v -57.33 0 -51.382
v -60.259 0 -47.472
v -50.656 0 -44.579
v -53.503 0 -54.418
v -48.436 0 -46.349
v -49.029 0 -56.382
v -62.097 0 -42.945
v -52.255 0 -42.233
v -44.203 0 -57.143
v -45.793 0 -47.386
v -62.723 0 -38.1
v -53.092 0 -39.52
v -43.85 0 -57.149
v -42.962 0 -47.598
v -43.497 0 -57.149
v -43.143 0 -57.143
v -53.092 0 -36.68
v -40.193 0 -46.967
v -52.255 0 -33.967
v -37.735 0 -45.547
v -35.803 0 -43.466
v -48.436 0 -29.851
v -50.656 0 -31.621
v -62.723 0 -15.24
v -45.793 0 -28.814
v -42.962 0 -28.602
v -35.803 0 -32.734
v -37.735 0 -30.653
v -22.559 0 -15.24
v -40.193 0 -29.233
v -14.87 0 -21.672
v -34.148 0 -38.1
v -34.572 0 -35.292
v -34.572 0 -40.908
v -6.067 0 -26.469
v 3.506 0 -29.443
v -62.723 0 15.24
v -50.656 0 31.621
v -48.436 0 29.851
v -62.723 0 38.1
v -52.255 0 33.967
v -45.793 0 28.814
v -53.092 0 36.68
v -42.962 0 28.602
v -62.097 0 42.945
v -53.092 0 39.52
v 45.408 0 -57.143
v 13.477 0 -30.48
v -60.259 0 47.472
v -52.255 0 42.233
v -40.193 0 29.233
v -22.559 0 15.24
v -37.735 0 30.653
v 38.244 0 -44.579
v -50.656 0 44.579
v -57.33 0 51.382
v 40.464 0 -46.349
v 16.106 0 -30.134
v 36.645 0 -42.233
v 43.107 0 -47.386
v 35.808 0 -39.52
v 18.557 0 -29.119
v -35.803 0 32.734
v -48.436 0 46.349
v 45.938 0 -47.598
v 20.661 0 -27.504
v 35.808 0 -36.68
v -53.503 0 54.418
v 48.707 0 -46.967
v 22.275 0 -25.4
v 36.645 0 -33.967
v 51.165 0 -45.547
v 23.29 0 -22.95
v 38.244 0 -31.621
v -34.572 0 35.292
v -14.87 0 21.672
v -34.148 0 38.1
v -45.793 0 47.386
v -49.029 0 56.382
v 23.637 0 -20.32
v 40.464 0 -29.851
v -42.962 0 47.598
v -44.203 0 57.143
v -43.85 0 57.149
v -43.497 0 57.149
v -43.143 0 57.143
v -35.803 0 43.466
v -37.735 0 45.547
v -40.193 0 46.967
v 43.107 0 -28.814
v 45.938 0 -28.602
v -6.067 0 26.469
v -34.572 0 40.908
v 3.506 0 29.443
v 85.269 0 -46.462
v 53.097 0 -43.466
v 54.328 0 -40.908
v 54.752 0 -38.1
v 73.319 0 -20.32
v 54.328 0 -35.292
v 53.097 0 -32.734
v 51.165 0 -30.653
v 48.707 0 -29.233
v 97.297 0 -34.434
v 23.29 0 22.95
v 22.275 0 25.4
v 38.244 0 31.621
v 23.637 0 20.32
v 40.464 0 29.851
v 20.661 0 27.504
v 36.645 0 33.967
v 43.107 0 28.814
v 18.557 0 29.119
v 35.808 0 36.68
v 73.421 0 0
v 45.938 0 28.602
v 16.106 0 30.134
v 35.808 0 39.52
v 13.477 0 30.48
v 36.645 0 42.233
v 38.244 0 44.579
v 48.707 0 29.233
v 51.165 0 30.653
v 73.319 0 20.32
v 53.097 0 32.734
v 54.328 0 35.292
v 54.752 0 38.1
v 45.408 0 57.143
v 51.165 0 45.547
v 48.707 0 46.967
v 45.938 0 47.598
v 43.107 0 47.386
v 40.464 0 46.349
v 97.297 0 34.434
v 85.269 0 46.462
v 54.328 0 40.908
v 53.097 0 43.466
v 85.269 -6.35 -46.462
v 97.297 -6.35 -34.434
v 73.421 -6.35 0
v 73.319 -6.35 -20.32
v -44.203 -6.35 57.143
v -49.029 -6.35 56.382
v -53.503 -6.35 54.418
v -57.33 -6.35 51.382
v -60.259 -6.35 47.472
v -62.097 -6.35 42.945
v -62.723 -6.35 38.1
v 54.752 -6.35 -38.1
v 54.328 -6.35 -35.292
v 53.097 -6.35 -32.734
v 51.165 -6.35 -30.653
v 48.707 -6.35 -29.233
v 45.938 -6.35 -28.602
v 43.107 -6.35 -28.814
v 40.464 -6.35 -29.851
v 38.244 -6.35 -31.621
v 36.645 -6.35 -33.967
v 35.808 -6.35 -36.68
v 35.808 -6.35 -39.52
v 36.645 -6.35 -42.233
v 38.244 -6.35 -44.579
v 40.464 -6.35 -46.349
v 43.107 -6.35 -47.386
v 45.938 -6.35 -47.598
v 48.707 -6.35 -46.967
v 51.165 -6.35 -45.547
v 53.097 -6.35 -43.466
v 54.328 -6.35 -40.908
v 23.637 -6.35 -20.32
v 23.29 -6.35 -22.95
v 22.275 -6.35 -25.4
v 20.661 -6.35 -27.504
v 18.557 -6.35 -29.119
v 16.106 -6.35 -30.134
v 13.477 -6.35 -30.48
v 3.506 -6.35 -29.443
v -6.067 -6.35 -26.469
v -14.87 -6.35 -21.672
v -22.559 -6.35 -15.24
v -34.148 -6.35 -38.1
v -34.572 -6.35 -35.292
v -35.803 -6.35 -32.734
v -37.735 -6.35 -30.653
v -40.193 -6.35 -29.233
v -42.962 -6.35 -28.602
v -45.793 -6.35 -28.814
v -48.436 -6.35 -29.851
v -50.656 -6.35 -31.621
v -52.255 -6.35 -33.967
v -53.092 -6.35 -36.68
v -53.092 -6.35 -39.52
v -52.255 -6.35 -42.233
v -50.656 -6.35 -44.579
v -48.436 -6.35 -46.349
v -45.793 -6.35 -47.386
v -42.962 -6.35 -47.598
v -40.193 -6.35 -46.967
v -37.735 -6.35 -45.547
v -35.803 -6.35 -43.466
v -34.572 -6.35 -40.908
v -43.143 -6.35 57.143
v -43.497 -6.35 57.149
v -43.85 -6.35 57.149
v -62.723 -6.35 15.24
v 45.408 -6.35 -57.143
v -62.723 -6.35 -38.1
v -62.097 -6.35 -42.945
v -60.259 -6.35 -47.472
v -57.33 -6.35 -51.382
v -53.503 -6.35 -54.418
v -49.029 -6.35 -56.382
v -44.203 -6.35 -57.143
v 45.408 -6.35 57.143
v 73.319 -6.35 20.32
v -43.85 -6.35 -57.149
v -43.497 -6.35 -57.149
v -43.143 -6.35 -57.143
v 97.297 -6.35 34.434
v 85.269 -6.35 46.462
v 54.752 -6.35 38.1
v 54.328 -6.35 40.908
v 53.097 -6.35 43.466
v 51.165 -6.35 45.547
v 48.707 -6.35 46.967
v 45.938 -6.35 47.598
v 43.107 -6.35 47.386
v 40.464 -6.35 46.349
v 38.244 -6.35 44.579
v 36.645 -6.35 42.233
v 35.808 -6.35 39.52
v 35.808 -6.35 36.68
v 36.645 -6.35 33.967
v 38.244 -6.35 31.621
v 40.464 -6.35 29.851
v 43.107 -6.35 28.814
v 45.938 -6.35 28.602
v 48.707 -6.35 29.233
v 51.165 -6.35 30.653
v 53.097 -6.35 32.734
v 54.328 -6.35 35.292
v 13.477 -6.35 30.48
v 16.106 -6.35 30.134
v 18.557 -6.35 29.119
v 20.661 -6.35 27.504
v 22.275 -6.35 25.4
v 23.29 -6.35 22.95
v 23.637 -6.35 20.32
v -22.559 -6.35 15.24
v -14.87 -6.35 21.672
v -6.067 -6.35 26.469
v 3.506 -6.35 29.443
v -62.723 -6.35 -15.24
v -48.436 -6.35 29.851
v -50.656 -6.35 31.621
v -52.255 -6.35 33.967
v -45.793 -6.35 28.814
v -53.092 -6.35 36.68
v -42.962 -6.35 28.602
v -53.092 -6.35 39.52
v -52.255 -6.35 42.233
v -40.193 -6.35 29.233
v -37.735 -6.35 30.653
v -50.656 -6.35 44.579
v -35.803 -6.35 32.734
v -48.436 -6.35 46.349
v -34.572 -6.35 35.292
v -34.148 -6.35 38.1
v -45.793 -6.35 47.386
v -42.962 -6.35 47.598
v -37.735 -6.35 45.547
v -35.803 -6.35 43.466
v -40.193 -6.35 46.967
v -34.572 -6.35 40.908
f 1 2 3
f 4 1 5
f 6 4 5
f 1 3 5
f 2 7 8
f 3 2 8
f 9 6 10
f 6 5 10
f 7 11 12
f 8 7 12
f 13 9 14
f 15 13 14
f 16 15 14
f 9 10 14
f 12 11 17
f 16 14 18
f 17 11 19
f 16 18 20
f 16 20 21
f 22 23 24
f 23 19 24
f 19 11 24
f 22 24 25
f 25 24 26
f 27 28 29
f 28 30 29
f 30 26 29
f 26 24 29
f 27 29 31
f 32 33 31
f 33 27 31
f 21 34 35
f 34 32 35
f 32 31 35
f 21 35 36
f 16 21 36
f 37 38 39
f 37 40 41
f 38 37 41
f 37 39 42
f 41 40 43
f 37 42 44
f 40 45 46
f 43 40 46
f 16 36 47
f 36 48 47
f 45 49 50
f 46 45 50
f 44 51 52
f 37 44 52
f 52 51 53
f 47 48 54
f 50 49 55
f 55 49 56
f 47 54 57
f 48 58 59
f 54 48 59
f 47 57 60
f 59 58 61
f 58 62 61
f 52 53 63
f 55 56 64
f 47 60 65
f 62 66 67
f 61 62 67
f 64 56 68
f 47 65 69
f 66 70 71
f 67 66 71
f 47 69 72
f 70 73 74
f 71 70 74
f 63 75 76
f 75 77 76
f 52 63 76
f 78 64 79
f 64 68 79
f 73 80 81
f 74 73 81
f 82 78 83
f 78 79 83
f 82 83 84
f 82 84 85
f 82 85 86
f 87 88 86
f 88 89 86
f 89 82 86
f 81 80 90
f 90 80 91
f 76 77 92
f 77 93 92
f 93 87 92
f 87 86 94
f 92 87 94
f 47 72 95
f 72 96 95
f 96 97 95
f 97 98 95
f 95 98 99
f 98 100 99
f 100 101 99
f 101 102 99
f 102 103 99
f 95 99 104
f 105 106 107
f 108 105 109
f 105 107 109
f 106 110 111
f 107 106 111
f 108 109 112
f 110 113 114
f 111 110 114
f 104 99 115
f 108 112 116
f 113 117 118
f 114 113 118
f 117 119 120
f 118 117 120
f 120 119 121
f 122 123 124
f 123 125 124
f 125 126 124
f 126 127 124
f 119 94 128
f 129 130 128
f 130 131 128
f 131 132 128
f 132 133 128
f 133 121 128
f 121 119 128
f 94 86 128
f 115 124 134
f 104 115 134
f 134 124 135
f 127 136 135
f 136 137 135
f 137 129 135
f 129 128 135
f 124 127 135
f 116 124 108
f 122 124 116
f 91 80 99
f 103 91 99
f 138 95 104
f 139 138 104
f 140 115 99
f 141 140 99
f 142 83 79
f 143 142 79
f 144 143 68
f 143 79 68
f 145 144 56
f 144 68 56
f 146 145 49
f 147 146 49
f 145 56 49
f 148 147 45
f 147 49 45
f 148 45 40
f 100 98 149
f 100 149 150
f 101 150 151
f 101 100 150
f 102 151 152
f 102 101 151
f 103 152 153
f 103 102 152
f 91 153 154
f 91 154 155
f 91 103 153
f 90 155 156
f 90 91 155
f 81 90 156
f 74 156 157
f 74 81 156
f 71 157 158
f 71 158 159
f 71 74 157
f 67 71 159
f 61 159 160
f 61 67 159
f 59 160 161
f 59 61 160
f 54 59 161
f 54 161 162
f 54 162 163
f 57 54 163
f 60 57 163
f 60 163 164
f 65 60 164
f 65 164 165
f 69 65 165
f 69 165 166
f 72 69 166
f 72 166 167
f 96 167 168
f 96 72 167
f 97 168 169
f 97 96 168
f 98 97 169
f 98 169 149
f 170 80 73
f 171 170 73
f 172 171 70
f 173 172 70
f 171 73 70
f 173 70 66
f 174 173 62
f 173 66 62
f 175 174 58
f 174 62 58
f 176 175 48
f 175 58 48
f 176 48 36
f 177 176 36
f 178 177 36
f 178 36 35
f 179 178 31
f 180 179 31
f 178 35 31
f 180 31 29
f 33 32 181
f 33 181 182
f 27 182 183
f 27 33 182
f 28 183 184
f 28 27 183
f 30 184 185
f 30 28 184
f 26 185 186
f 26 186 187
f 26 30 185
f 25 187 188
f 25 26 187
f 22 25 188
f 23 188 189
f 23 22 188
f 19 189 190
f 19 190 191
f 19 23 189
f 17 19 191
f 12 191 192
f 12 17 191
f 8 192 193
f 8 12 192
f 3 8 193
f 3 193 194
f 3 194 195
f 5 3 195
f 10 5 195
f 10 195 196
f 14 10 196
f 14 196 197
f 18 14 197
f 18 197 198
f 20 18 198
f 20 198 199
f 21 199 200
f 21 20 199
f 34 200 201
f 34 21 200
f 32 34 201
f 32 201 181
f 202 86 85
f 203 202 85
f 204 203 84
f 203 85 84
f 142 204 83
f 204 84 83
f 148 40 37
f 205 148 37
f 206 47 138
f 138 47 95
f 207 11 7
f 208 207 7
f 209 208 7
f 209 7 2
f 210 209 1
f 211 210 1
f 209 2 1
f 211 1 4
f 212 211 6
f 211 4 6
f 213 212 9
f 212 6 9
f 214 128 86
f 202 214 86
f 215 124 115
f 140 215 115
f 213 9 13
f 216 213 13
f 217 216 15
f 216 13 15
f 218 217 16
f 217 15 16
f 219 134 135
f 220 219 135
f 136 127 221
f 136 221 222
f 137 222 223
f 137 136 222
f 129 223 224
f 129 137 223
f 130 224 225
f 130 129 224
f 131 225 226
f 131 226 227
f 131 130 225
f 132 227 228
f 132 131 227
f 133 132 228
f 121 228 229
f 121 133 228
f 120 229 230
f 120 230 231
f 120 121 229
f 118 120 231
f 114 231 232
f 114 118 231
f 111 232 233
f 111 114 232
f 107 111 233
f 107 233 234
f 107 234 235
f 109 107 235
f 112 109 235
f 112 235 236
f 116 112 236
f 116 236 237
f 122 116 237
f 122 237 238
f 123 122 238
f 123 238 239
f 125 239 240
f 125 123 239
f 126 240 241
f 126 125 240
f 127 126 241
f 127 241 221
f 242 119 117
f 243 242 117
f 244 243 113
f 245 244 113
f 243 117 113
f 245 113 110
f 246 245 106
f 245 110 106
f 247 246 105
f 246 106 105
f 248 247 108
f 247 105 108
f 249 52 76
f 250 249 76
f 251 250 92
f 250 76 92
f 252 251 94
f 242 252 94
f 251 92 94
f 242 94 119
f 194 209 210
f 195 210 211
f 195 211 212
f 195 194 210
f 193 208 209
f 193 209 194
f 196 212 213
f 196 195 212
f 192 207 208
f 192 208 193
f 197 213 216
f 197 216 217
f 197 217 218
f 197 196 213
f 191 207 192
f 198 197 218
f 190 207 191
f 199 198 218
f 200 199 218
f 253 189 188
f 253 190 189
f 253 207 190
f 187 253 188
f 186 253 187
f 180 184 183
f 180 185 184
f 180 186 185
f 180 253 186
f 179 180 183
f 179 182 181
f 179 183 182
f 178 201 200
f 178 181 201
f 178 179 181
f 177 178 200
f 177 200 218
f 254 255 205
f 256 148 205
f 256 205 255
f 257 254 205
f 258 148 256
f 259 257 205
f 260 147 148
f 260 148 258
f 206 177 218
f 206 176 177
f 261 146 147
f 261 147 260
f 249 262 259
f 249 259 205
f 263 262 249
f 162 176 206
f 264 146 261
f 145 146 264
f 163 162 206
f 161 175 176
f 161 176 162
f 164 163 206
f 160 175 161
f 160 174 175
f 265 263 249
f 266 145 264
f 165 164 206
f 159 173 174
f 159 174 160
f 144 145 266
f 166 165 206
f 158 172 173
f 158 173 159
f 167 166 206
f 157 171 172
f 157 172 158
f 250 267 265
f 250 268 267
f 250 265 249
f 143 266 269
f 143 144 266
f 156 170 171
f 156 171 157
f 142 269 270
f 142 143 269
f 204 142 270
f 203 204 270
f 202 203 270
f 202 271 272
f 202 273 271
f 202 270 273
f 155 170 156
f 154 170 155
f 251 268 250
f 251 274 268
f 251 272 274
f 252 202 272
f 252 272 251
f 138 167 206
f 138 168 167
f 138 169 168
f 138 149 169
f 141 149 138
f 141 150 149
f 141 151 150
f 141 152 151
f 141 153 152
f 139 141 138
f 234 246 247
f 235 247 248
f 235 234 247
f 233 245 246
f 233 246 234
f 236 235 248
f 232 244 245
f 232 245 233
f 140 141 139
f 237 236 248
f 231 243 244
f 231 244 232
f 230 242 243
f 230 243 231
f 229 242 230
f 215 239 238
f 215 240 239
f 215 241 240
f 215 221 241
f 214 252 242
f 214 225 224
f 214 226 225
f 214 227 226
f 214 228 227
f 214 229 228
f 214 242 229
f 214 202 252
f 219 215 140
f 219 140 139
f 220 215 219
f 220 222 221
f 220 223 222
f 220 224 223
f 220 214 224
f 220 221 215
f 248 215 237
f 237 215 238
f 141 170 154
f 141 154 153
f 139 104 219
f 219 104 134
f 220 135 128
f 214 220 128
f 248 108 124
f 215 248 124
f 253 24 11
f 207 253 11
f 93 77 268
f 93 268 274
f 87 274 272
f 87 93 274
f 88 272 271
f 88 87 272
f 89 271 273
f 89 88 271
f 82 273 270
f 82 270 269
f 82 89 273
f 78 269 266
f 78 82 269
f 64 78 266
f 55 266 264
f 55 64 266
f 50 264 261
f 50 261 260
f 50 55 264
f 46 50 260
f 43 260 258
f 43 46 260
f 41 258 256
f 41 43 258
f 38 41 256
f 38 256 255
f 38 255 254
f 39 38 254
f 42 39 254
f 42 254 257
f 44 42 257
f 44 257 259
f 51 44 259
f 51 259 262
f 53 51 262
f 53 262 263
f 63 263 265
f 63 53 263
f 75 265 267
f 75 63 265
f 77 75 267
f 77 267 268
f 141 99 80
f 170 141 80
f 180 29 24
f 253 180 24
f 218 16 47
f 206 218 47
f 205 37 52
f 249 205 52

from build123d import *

# Parameters (mm, degrees)
F0_R     = 9.525
F1_DEPTH = 6.35


with BuildPart() as f1:
    # F0 (on Front) → F1 (new body)
    with BuildSketch(Plane.XZ):
        with BuildLine():
            ThreePointArc((-44.203452, 57.142624), (-57.329882, 51.381651), (-62.723372, 38.1))
            Line((-62.723372, 38.1), (-62.723372, 15.24))
            Line((-62.723372, 15.24), (-22.559377, 15.24))
            ThreePointArc((-22.559377, 15.24), (-6.067452, 26.468514), (13.476628, 30.48))
            ThreePointArc((13.476628, 30.48), (20.660833, 27.504205), (23.636628, 20.32))
            Line((23.636628, 20.32), (73.318773, 20.32))
            Line((73.318773, 20.32), (73.420628, 0))
            Line((73.420628, 0), (73.318773, -20.32))
            Line((73.318773, -20.32), (23.636628, -20.32))
            ThreePointArc((23.636628, -20.32), (20.660833, -27.504205), (13.476628, -30.48))
            ThreePointArc((13.476628, -30.48), (-6.067452, -26.468514), (-22.559377, -15.24))
            Line((-22.559377, -15.24), (-62.723372, -15.24))
            Line((-62.723372, -15.24), (-62.723372, -38.1))
            ThreePointArc((-62.723372, -38.1), (-57.329882, -51.381651), (-44.203452, -57.142624))
            Line((-44.203452, -57.142624), (-43.143292, -57.142624))
            Line((-43.143292, -57.142624), (45.408478, -57.142624))
            Line((45.408478, -57.142624), (85.268794, -46.462084))
            Line((85.268794, -46.462084), (97.296628, -34.43425))
            Line((97.296628, -34.43425), (97.296628, 0))
            Line((97.296628, 0), (97.296628, 34.43425))
            Line((97.296628, 34.43425), (85.268794, 46.462084))
            Line((85.268794, 46.462084), (45.408478, 57.142624))
            Line((45.408478, 57.142624), (-43.143292, 57.142624))
            Line((-43.143292, 57.142624), (-44.203452, 57.142624))
        make_face()
        with Locations((-43.673372, -38.1)):
            Circle(F0_R, mode=Mode.SUBTRACT)
        with Locations((45.226628, -38.1)):
            Circle(F0_R, mode=Mode.SUBTRACT)
        with Locations((-43.673372, 38.1)):
            Circle(F0_R, mode=Mode.SUBTRACT)
        with Locations((45.226628, 38.1)):
            Circle(F0_R, mode=Mode.SUBTRACT)
        with BuildLine():
            ThreePointArc((-43.143292, 57.142624), (-43.673372, 57.15), (-44.203452, 57.142624))
            Line((-44.203452, 57.142624), (-43.143292, 57.142624))
        make_face()
        with BuildLine():
            ThreePointArc((-44.203452, -57.142624), (-43.673372, -57.15), (-43.143292, -57.142624))
            Line((-43.143292, -57.142624), (-44.203452, -57.142624))
        make_face()
    extrude(amount=F1_DEPTH)


solid = f1.part
